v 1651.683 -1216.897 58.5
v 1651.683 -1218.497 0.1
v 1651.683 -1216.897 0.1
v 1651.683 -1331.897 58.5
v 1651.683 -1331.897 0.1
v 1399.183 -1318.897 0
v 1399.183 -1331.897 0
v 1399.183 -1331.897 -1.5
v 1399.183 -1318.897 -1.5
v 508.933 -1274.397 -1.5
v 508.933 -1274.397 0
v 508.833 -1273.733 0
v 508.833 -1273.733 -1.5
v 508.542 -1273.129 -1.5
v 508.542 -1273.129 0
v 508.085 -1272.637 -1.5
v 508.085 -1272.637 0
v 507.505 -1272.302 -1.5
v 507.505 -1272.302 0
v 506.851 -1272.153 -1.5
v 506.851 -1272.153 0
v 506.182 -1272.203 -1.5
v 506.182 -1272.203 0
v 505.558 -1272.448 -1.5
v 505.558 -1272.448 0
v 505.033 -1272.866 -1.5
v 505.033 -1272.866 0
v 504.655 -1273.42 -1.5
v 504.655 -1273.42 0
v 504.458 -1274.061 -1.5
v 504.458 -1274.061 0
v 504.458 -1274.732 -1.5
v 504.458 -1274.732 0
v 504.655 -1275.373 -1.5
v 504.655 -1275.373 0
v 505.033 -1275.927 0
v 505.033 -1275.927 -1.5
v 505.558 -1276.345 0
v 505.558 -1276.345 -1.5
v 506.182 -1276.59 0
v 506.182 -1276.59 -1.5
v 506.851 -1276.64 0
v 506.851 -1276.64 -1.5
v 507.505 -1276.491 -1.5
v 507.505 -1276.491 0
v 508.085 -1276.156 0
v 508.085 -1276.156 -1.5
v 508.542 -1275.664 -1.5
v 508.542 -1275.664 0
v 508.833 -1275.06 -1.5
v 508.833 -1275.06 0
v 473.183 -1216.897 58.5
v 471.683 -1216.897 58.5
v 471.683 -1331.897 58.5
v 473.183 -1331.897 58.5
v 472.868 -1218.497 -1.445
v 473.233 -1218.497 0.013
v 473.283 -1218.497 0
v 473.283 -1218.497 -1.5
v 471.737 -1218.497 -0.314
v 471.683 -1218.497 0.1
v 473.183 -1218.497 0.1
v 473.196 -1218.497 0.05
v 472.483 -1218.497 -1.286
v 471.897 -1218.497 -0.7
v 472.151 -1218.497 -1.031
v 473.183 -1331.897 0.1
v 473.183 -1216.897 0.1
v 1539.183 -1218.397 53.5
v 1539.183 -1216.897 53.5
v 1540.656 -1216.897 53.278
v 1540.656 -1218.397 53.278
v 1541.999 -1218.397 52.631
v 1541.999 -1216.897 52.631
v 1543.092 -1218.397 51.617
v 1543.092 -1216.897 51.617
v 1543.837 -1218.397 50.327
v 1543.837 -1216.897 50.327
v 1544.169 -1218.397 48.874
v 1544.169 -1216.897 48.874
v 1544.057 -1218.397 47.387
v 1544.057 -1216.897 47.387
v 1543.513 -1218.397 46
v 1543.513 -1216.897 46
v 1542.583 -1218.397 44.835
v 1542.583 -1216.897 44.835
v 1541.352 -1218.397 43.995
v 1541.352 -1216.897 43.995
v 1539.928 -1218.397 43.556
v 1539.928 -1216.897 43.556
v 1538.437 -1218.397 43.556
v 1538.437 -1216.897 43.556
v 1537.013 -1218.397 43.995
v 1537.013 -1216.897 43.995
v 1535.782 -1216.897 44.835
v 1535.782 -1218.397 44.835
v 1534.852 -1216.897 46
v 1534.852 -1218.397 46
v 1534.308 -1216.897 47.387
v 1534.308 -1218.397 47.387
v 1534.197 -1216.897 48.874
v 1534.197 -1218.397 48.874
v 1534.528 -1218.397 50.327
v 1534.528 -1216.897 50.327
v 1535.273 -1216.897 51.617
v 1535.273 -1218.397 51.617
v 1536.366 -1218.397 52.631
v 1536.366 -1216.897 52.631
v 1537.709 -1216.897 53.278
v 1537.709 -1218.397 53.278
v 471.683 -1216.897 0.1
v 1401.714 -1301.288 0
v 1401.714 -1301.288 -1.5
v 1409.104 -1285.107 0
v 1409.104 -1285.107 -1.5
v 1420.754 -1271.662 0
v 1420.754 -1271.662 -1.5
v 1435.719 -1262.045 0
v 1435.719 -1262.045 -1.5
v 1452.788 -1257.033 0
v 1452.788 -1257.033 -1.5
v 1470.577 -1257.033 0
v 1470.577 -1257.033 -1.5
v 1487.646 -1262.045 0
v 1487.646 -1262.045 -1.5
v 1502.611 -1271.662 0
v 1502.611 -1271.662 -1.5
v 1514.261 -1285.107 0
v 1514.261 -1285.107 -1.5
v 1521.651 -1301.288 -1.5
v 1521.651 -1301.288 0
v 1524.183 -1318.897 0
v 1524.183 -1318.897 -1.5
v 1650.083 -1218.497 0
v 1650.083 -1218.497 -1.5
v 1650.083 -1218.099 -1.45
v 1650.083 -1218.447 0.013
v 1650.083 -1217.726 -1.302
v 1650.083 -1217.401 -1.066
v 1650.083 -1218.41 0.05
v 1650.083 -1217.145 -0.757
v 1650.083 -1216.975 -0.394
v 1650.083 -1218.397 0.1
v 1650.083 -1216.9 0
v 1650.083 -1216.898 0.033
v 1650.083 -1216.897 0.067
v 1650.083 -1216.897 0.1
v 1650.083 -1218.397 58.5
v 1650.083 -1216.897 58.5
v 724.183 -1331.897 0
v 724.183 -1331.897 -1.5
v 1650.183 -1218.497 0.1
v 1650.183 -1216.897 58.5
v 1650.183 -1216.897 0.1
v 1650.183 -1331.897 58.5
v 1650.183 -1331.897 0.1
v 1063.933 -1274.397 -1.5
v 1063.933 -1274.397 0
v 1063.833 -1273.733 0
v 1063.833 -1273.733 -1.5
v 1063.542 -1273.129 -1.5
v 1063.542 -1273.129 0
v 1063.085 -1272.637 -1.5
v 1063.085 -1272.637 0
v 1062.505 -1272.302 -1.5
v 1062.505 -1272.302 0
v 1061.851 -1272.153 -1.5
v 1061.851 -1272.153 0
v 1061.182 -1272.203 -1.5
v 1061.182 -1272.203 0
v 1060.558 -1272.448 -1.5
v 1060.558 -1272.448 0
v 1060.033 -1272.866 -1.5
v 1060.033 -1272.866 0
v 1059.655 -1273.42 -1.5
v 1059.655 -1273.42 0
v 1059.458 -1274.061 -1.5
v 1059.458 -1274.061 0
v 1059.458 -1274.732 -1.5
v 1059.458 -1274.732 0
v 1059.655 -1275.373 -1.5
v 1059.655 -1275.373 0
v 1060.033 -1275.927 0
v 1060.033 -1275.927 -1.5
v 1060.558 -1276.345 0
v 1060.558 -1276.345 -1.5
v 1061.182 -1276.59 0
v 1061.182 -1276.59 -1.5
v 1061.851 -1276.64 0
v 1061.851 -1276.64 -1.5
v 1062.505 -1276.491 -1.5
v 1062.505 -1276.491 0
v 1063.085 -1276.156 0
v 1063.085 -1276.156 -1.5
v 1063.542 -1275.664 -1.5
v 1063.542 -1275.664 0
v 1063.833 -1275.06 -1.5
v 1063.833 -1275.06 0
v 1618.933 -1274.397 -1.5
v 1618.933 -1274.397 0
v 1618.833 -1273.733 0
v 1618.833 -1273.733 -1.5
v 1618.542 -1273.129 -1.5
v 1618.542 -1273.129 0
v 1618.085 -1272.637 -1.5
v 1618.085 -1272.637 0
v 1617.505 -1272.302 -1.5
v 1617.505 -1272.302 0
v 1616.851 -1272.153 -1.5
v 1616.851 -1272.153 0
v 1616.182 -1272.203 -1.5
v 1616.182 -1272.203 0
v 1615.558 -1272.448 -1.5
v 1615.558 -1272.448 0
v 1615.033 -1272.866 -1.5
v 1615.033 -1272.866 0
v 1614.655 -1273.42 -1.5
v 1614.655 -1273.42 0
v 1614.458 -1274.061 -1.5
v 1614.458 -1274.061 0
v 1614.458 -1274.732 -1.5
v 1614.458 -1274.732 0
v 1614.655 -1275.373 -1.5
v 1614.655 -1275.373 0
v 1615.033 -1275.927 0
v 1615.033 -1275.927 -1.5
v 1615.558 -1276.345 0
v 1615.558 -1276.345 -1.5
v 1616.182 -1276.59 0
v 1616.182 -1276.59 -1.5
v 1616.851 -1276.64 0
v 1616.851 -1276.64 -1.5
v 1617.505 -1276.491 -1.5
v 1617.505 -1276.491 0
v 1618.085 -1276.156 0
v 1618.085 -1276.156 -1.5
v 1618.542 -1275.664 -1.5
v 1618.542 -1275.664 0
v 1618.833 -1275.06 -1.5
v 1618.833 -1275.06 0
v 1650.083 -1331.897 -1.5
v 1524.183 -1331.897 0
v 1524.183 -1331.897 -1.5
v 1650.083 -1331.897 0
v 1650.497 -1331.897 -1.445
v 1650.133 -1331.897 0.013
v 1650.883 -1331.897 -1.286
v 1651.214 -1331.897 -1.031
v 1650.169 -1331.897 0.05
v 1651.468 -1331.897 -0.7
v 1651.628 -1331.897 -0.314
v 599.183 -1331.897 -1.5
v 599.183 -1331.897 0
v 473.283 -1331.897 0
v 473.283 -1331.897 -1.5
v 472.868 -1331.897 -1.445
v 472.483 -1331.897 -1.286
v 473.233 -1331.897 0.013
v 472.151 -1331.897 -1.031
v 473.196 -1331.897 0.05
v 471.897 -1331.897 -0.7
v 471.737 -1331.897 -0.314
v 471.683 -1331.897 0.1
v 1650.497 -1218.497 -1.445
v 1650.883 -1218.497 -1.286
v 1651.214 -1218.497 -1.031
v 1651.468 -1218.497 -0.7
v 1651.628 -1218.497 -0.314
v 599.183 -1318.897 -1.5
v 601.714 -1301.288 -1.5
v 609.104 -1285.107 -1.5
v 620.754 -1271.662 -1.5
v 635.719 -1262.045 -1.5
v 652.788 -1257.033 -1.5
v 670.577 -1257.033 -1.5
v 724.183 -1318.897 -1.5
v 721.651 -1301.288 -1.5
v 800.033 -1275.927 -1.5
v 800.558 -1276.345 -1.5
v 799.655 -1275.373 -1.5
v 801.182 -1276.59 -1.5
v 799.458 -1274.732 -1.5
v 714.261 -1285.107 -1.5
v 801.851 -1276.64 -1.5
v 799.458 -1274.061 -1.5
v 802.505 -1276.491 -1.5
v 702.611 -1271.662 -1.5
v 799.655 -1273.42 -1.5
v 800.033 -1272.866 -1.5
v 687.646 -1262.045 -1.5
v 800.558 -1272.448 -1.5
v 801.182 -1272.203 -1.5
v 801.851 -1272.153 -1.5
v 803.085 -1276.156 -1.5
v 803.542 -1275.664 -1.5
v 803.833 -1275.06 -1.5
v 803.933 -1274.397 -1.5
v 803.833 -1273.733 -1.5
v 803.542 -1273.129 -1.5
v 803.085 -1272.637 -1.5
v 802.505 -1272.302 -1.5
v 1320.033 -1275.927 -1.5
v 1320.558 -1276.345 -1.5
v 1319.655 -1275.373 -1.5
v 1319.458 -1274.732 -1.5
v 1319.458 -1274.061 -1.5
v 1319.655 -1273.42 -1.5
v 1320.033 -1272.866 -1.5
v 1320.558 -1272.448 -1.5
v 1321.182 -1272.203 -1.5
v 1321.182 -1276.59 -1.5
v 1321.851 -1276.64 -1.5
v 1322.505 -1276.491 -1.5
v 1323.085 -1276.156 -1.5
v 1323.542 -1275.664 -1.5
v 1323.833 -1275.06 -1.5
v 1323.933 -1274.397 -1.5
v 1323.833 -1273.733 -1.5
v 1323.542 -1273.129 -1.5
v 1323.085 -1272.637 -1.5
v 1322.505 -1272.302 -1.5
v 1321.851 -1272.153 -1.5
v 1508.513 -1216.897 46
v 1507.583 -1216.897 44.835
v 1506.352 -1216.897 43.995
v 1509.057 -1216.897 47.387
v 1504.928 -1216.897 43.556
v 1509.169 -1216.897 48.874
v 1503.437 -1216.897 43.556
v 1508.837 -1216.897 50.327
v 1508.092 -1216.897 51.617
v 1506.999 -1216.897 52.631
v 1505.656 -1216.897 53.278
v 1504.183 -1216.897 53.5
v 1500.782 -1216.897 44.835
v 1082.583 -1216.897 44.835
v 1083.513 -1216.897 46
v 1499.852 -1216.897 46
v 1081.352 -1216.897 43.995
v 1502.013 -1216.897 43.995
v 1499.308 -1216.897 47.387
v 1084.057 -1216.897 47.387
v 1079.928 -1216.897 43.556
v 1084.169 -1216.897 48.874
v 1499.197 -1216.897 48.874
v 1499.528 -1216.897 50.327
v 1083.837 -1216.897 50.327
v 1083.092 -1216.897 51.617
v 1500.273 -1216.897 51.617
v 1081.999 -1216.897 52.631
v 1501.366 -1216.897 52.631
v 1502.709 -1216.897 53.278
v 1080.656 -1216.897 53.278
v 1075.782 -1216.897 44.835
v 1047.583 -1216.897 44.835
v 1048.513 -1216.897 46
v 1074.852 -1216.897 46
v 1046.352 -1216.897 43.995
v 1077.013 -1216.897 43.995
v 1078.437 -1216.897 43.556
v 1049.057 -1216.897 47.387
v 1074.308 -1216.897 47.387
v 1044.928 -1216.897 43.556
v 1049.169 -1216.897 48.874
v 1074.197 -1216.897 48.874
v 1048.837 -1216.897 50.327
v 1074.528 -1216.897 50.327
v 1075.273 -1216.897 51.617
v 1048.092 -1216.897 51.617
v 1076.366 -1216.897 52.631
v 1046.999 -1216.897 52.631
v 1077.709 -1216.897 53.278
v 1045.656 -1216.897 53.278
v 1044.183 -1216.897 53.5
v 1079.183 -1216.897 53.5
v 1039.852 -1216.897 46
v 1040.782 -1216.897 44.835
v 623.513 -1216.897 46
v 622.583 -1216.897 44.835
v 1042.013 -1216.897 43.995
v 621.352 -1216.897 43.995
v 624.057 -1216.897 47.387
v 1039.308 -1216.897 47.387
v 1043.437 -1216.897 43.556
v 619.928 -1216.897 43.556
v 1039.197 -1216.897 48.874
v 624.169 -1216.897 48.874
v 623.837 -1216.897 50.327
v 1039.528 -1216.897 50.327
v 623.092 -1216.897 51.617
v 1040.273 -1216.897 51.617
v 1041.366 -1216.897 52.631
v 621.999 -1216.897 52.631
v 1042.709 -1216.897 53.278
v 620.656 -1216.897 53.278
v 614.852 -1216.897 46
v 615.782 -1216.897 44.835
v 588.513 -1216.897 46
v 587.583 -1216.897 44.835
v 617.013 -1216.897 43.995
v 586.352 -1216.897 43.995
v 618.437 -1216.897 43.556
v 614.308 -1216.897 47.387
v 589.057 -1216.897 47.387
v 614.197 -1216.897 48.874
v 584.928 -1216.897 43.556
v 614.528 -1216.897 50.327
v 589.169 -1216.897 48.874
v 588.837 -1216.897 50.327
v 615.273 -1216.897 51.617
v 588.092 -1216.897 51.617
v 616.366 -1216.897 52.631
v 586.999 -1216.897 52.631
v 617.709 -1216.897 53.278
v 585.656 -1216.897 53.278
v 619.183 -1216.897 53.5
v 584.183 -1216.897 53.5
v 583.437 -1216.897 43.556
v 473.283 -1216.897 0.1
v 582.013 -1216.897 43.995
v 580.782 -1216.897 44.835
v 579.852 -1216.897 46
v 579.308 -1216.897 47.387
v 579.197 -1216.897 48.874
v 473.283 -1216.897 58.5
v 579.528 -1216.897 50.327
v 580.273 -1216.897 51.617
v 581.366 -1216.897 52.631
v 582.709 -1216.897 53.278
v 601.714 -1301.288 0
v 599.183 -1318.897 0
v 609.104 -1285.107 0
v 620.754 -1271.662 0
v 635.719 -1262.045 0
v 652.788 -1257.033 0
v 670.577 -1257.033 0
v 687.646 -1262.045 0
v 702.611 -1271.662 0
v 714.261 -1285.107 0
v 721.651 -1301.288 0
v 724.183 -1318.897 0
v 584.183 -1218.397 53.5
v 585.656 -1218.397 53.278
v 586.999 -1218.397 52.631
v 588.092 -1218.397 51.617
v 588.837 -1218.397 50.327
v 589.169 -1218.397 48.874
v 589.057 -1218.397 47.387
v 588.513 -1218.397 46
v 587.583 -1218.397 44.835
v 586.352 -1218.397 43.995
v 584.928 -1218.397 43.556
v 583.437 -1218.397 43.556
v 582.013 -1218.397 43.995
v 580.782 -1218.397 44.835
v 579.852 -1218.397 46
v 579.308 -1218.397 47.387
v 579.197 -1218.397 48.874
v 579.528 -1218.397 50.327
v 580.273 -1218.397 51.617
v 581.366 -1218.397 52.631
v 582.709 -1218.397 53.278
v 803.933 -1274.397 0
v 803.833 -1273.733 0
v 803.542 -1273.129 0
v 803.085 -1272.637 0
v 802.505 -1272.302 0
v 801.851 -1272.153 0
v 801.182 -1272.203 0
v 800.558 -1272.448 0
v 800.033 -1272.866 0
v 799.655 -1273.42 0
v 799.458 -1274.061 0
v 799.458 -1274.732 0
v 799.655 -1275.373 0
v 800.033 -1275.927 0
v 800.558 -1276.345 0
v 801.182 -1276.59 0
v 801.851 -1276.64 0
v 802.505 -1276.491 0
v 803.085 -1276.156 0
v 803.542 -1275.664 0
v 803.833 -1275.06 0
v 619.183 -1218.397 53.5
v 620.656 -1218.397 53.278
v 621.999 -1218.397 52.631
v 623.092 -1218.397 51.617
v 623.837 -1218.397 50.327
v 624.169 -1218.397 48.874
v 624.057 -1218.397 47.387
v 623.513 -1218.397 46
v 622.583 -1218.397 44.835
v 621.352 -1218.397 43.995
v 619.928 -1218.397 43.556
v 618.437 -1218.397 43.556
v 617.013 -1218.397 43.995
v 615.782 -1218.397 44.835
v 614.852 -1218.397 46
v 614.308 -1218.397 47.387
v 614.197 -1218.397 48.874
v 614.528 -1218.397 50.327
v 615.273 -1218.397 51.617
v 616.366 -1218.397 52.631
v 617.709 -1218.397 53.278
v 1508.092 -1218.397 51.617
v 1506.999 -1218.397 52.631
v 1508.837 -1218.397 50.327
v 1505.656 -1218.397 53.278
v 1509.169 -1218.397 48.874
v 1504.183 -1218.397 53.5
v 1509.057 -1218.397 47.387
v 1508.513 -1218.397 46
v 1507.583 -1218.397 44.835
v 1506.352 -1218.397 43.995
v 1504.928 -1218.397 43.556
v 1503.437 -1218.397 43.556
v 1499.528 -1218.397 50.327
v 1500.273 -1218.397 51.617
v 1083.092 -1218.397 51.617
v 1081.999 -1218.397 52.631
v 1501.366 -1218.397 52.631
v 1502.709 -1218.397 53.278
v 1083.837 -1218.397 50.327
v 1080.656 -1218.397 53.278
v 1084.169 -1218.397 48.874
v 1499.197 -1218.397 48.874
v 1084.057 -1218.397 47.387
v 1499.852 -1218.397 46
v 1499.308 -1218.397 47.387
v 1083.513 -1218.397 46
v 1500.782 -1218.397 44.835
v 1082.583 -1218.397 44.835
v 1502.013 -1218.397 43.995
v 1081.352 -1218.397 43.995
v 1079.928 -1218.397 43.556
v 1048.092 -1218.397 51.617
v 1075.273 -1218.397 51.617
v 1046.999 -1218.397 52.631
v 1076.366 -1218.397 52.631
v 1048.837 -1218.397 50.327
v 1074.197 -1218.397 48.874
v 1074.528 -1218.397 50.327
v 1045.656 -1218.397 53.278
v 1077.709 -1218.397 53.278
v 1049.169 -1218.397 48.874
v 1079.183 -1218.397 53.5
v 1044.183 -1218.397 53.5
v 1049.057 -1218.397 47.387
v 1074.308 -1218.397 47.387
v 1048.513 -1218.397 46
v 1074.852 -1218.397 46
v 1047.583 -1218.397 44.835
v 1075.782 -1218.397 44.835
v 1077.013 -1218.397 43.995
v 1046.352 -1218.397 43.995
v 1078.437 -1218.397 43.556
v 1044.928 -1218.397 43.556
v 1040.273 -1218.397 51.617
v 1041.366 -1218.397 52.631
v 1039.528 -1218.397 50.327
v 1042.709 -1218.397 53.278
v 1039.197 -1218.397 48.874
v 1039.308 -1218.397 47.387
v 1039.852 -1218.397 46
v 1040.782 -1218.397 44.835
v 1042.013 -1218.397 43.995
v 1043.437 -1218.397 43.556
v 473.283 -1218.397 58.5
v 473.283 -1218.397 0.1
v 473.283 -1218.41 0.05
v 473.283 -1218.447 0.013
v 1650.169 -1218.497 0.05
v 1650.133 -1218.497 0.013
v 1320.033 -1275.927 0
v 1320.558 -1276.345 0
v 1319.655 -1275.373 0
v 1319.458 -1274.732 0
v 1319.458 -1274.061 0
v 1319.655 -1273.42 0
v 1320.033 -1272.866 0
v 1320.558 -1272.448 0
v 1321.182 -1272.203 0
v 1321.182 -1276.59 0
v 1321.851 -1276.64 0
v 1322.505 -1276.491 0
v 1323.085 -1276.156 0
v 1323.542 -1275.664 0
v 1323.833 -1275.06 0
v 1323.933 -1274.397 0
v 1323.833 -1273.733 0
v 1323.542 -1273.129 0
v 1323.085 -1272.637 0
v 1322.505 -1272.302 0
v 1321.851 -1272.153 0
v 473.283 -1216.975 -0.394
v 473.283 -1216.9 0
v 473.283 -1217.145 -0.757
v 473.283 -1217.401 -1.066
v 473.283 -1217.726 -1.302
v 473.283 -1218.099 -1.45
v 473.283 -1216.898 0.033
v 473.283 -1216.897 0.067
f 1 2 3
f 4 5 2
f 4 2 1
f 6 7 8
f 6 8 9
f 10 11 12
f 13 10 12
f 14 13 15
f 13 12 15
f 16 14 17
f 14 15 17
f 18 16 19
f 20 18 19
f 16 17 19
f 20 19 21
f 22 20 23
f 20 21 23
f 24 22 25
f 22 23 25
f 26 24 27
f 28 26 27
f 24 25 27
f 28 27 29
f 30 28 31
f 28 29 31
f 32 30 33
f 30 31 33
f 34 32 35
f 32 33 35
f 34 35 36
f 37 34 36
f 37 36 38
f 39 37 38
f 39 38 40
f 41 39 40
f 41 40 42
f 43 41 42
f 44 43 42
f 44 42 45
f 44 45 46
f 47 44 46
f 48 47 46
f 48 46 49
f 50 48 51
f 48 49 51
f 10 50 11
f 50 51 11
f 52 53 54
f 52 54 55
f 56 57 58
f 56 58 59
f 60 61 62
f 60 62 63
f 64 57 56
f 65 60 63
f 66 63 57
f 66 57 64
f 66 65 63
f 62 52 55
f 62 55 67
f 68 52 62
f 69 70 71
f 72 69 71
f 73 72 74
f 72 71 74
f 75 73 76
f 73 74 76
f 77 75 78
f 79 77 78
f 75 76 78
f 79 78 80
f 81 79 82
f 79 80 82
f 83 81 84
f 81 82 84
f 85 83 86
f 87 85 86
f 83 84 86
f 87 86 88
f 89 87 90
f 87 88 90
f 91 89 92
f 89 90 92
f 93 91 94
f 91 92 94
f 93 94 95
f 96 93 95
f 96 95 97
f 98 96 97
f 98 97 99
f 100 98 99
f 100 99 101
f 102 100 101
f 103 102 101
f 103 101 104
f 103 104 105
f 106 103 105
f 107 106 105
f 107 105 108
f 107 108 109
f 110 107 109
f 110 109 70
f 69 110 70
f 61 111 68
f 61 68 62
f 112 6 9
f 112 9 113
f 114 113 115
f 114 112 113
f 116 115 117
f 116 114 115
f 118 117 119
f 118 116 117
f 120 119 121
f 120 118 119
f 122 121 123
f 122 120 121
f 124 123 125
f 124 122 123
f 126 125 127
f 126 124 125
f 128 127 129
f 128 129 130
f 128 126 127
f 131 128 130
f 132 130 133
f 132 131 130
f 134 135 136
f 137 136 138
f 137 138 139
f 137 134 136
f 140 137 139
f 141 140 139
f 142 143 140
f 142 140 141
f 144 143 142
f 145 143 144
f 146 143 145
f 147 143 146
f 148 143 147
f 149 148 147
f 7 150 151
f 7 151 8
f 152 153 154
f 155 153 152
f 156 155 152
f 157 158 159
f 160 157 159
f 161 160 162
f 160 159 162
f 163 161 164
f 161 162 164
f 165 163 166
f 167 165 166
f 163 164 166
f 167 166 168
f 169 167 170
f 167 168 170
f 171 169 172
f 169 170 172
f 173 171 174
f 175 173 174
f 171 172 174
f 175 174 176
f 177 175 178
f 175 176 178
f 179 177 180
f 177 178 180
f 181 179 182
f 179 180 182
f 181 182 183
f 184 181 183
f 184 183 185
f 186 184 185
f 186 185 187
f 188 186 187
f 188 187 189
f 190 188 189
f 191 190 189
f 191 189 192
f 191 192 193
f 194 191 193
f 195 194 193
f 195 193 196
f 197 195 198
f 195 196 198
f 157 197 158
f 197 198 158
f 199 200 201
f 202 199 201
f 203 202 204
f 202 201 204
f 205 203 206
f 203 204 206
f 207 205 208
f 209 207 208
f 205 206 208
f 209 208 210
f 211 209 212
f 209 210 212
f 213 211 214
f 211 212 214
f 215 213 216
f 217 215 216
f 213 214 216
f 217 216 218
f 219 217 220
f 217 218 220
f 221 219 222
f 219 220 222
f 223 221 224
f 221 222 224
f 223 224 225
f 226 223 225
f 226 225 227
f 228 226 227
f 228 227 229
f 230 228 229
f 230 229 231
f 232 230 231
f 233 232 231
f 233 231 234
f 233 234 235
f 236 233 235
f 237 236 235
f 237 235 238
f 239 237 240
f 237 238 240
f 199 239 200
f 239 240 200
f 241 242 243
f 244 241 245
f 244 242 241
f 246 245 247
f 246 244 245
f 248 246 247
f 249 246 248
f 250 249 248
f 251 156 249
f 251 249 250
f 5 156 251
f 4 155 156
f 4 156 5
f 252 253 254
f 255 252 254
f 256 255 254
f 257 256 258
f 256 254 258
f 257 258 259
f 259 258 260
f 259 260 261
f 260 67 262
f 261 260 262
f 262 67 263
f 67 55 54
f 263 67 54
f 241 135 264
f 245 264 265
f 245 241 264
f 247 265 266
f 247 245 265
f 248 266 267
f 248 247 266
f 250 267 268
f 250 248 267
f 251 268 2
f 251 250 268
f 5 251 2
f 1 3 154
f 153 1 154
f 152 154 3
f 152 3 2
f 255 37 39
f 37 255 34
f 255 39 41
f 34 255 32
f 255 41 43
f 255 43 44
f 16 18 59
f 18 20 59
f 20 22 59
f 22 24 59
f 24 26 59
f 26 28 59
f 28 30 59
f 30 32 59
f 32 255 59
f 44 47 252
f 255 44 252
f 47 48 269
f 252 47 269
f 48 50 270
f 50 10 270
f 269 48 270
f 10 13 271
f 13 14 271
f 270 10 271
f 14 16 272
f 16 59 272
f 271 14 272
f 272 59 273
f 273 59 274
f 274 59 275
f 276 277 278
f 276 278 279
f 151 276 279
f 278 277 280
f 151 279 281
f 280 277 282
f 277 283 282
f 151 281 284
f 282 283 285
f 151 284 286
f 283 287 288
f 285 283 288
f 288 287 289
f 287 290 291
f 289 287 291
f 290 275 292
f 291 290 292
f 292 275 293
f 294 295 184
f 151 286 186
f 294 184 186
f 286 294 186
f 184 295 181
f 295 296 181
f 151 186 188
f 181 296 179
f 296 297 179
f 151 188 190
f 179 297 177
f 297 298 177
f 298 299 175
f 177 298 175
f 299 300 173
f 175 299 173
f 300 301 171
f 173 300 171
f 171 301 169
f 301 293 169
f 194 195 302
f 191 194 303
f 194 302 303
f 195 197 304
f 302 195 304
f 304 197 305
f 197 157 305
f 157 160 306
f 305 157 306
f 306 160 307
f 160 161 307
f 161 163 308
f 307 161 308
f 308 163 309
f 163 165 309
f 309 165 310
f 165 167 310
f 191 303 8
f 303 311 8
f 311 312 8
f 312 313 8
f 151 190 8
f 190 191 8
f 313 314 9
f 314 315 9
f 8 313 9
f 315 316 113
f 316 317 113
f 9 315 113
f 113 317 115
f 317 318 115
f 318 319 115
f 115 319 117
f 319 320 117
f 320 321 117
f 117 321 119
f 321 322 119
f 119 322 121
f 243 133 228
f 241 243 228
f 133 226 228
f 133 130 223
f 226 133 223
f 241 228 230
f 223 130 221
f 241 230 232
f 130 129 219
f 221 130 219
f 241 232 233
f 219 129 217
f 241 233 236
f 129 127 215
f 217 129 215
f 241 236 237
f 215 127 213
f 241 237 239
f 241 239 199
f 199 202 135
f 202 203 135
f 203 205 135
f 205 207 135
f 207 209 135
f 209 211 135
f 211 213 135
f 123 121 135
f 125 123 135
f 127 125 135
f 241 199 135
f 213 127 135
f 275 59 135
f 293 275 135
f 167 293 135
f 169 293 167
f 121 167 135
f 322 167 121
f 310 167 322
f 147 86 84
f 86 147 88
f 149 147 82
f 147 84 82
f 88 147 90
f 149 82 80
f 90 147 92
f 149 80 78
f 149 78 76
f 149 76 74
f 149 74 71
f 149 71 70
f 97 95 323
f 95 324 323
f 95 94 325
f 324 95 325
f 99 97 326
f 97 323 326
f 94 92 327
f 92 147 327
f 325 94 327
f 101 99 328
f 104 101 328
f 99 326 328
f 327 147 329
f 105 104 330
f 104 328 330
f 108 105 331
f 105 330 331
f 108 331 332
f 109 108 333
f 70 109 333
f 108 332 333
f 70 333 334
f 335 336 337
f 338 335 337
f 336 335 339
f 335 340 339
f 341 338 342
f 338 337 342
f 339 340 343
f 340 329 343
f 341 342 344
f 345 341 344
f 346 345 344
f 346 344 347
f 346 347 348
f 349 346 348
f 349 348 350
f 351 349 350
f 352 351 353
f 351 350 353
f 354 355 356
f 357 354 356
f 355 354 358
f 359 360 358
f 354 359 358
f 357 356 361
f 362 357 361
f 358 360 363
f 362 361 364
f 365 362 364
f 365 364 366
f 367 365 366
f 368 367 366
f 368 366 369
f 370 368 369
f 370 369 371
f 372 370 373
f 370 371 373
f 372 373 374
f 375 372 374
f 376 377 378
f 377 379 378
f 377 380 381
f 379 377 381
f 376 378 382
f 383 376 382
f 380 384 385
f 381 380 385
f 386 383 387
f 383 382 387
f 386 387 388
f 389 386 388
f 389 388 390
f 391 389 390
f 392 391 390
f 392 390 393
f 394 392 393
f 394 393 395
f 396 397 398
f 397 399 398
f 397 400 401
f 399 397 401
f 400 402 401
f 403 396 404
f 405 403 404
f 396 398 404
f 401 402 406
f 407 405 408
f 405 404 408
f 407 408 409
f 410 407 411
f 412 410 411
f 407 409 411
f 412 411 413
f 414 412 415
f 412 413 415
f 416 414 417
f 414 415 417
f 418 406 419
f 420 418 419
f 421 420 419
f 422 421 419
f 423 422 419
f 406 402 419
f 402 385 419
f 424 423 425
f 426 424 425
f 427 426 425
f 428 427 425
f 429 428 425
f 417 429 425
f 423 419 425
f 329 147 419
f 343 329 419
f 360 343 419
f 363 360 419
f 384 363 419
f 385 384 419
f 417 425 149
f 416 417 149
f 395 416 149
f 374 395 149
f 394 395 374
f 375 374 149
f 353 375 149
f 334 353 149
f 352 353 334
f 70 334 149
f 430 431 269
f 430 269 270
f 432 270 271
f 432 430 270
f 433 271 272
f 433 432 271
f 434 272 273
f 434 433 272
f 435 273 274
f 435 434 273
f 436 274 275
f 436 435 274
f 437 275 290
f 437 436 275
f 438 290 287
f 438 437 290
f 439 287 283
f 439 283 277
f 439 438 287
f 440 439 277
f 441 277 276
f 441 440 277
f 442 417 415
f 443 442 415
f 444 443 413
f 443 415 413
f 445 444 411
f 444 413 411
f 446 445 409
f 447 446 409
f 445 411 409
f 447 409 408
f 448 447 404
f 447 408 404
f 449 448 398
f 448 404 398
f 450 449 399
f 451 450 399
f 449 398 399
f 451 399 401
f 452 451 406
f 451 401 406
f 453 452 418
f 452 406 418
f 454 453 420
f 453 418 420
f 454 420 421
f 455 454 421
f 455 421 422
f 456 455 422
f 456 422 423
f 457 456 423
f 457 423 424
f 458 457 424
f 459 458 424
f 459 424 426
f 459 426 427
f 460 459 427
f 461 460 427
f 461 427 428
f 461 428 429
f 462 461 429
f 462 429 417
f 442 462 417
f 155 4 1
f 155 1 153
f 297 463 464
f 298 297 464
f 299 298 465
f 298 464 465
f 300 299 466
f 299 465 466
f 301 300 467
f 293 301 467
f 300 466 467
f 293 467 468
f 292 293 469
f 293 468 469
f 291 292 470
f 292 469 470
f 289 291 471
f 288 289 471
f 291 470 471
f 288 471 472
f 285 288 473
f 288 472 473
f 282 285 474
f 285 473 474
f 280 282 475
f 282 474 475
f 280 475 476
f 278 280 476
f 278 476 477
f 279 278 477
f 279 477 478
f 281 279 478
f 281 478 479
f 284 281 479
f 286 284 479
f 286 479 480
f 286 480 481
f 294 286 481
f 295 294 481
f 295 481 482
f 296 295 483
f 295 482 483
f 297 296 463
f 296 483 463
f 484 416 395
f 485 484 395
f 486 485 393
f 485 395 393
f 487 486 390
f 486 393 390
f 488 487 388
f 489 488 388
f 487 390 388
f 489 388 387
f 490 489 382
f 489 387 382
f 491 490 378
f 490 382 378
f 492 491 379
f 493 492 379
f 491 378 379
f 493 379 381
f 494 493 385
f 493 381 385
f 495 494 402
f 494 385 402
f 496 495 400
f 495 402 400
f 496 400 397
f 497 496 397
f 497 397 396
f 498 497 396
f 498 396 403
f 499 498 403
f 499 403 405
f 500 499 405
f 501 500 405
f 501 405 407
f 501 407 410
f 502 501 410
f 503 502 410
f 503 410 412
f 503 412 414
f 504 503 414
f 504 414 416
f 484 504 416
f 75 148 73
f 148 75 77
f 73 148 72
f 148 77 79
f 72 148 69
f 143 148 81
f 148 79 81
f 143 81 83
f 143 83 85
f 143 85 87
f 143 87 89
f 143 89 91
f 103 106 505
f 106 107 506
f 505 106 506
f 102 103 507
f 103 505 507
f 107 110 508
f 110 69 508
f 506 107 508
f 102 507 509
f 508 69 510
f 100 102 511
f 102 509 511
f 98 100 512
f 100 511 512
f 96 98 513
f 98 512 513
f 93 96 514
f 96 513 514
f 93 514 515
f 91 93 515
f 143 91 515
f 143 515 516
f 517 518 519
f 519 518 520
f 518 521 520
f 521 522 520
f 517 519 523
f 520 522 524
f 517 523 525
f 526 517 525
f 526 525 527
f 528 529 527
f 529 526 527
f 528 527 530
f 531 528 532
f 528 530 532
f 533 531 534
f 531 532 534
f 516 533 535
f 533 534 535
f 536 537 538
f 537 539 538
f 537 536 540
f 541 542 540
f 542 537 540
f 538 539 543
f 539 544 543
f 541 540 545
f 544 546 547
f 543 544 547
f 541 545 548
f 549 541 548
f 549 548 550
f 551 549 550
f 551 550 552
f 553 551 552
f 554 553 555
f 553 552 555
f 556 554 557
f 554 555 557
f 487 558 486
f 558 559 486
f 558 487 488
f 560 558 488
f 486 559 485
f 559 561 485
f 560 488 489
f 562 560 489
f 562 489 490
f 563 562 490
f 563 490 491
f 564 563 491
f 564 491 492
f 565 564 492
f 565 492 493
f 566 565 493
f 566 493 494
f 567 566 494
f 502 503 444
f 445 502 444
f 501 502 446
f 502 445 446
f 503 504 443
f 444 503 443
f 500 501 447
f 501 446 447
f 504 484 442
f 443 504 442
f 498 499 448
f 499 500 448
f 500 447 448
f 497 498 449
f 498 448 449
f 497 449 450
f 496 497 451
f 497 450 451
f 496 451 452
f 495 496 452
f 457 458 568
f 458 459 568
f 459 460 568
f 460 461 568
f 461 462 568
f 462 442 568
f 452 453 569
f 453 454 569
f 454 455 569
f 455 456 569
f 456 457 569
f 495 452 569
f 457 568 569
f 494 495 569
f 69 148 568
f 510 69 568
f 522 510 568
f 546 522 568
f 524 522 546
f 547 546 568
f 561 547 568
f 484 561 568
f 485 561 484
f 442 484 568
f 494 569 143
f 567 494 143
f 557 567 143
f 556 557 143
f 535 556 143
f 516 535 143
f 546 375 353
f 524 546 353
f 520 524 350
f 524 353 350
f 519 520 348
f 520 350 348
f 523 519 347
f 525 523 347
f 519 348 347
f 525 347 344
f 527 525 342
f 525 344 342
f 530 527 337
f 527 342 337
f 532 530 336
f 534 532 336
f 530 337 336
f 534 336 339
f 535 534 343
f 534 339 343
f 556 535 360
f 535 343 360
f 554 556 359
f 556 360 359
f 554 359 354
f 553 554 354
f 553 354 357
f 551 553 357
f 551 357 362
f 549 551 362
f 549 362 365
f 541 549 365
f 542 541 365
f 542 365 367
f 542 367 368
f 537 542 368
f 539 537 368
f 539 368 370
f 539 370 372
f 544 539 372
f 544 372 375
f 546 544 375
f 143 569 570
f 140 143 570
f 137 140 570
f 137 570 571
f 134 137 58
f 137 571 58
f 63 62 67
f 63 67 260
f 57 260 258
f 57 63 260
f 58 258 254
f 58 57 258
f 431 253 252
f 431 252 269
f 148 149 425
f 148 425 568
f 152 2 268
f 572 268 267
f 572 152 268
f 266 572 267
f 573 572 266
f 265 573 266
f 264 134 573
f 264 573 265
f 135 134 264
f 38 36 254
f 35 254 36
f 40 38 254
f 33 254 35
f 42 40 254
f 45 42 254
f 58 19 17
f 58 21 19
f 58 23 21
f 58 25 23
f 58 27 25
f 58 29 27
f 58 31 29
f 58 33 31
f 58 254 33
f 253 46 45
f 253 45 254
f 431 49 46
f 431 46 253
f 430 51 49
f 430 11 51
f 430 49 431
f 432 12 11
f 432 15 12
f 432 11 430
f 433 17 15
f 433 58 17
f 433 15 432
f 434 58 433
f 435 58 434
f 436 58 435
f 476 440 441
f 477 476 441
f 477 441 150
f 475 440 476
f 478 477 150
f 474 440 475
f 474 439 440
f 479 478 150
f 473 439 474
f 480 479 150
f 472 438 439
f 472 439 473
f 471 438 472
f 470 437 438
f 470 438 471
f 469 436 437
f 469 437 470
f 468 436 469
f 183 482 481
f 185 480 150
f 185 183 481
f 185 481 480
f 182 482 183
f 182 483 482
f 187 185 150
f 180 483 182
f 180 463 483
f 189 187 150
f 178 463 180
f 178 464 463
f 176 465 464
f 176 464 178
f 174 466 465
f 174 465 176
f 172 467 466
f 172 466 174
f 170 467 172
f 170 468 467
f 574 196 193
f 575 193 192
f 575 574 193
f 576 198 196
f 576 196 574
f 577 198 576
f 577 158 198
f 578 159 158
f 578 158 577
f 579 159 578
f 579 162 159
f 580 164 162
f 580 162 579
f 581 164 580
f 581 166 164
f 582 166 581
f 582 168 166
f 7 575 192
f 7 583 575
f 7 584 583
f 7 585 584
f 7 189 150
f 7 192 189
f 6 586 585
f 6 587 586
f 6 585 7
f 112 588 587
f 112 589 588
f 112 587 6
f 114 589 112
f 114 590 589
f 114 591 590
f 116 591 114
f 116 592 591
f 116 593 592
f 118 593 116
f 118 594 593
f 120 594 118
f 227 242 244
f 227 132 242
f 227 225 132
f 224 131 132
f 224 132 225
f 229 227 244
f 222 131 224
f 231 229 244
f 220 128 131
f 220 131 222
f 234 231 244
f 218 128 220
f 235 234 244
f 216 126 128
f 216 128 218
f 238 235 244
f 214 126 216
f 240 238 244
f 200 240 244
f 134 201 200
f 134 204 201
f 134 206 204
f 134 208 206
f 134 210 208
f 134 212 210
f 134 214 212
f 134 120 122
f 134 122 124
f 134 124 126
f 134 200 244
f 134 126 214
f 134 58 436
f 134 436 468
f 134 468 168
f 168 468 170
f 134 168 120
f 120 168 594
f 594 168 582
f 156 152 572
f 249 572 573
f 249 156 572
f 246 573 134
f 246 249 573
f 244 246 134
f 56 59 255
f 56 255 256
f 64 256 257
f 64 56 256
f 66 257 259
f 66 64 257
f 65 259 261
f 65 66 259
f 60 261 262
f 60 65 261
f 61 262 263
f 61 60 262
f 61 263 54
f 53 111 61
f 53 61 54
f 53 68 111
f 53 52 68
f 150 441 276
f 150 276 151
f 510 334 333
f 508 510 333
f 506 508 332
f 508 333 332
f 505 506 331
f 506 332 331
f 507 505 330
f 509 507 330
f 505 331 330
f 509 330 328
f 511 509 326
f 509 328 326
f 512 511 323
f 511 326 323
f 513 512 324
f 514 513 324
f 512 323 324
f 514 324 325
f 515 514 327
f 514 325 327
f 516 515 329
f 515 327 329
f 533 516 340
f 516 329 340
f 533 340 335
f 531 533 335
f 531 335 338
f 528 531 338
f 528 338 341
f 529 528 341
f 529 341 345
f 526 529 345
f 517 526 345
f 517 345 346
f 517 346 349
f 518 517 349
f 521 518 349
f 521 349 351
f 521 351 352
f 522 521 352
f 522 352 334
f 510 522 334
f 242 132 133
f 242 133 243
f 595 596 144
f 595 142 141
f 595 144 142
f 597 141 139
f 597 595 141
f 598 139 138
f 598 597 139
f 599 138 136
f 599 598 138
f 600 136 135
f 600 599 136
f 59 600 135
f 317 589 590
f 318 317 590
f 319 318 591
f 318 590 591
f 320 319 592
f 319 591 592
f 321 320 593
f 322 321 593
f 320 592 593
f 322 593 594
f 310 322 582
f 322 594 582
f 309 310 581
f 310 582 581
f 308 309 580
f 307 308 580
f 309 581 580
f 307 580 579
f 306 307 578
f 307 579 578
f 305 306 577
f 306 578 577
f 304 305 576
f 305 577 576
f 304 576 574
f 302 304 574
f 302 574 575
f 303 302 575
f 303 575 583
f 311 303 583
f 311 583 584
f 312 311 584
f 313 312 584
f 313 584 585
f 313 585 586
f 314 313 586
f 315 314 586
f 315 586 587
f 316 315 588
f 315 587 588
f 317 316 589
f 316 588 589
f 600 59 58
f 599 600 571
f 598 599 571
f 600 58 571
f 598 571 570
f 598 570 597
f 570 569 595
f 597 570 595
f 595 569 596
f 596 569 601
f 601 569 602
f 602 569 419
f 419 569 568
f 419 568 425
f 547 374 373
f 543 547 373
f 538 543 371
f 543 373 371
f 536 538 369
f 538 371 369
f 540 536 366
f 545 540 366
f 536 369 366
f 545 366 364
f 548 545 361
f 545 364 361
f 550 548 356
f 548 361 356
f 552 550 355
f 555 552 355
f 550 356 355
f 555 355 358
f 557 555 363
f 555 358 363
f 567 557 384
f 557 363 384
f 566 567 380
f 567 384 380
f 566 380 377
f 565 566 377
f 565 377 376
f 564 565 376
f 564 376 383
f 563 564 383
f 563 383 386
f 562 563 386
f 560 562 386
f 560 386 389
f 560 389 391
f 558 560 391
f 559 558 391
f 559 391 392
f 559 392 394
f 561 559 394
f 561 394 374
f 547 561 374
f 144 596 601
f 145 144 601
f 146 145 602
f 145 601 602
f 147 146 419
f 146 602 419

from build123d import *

# Parameters (mm, degrees)
SKETCH_1_R                         = 2.25
SM_BASE_FLANGE_1_DEPTH             = 1.5
SM_EDGE_FLANGE_1_STRIP_W           = 6.2
SM_EDGE_FLANGE_1_STRIP_H           = 1.5
SM_EDGE_FLANGE_1_STRIP_CUT_DEPTH   = 115
SM_EDGE_FLANGE_1_STRIP_2_W         = 6.2
SM_EDGE_FLANGE_1_STRIP_2_H         = 1.5
SM_EDGE_FLANGE_1_STRIP_CUT_2_DEPTH = 115
SM_EDGE_FLANGE_1_DEPTH             = 115
SM_EDGE_FLANGE_1_BEND_DEPTH        = 115
SM_START                           = 471.682547587
SM_EDGE_FLANGE_2_DEPTH             = 1180
SM_EDGE_FLANGE_2_2_DEPTH           = 1.6
SM_START_2                         = 1650.082547587
SM_EDGE_FLANGE_2_3_DEPTH           = 1.6
SM_START_3                         = 473.282547587
SM_EDGE_FLANGE_2_4_DEPTH           = 1176.8
SKETCH_15_R                        = 5
CUT_EXTRUDE_1_DEPTH                = 10


# Read off the part's stored shape, not the designer's step: 边线-法兰2
# Sheet-metal steps are written as plain solids
with BuildPart() as part:
    # Sketch 1 → 基体-法兰1 (new body)
    with BuildSketch(Plane.XY):
        with BuildLine():
            Line((471.682547587, -1331.896552128), (473.182547587, -1331.896552128))
            Line((473.182547587, -1331.896552128), (473.919147587, -1331.896552128))
            Line((473.919147587, -1331.896552128), (599.182547587, -1331.896552128))
            Line((599.182547587, -1331.896552128), (599.182547587, -1318.896552128))
            ThreePointArc((599.182547587, -1318.896552128), (661.682547587, -1256.396552128), (724.182547587, -1318.896552128))
            Line((724.182547587, -1318.896552128), (724.182547587, -1331.896552128))
            Line((724.182547587, -1331.896552128), (1399.182547587, -1331.896552128))
            Line((1399.182547587, -1331.896552128), (1399.182547587, -1318.896552128))
            ThreePointArc((1399.182547587, -1318.896552128), (1461.682547587, -1256.396552128), (1524.182547587, -1318.896552128))
            Line((1524.182547587, -1318.896552128), (1524.182547587, -1331.896552128))
            Line((1524.182547587, -1331.896552128), (1649.445947587, -1331.896552128))
            Line((1649.445947587, -1331.896552128), (1650.182547587, -1331.896552128))
            Line((1650.182547587, -1331.896552128), (1651.682547587, -1331.896552128))
            Line((1651.682547587, -1331.896552128), (1651.682547587, -1216.896552128))
            Line((1651.682547587, -1216.896552128), (471.682547587, -1216.896552128))
            Line((471.682547587, -1216.896552128), (471.682547587, -1331.896552128))
        make_face()
        with Locations((801.682547587, -1274.396552128)):
            Circle(SKETCH_1_R, mode=Mode.SUBTRACT)
        with Locations((1321.682547587, -1274.396552128)):
            Circle(SKETCH_1_R, mode=Mode.SUBTRACT)
        with Locations((506.682547587, -1274.396552128)):
            Circle(SKETCH_1_R, mode=Mode.SUBTRACT)
        with Locations((1061.682547587, -1274.396552128)):
            Circle(SKETCH_1_R, mode=Mode.SUBTRACT)
        with Locations((1616.682547587, -1274.396552128)):
            Circle(SKETCH_1_R, mode=Mode.SUBTRACT)
    extrude(amount=-SM_BASE_FLANGE_1_DEPTH)

    # 边线-法兰1 strip (across the edge) → 边线-法兰1 strip cut (cut)
    with BuildSketch(Plane(origin=(1651.682547587, -1331.896552128, 0), x_dir=(-1, 0, 0), z_dir=(0, 1, 0))):
        with Locations((-1.5, -0.75)):
            Rectangle(SM_EDGE_FLANGE_1_STRIP_W, SM_EDGE_FLANGE_1_STRIP_H)
    extrude(amount=SM_EDGE_FLANGE_1_STRIP_CUT_DEPTH, mode=Mode.SUBTRACT)

    # 边线-法兰1 strip 2 (across the edge) → 边线-法兰1 strip cut 2 (cut)
    with BuildSketch(Plane(origin=(471.682547587, -1216.896552128, 0), x_dir=(1, 0, 0), z_dir=(0, -1, 0))):
        with Locations((-1.5, -0.75)):
            Rectangle(SM_EDGE_FLANGE_1_STRIP_2_W, SM_EDGE_FLANGE_1_STRIP_2_H)
    extrude(amount=SM_EDGE_FLANGE_1_STRIP_CUT_2_DEPTH, mode=Mode.SUBTRACT)

    # 边线-法兰1 section (across the edge) → 边线-法兰1 (add)
    with BuildSketch(Plane(origin=(1651.682547587, -1331.896552128, 0), x_dir=(-1, 0, 0), z_dir=(0, 1, 0))):
        with BuildLine():
            Line((0, 0.1), (0, 58.5))
            Line((0, 58.5), (1.5, 58.5))
            Line((1.5, 58.5), (1.5, 0.1))
            ThreePointArc((1.5, 0.1), (1.529289322, 0.029289322), (1.6, 0))
            Line((1.6, 0), (1.6, -1.5))
            ThreePointArc((1.6, -1.5), (0.46862915, -1.03137085), (0, 0.1))
        make_face()
    extrude(amount=SM_EDGE_FLANGE_1_DEPTH)

    # 边线-法兰1 section 2 (across the edge) → 边线-法兰1 bend (add)
    with BuildSketch(Plane(origin=(471.682547587, -1216.896552128, 0), x_dir=(1, 0, 0), z_dir=(0, -1, 0))):
        with BuildLine():
            Line((0, 0.1), (0, 58.5))
            Line((0, 58.5), (1.5, 58.5))
            Line((1.5, 58.5), (1.5, 0.1))
            ThreePointArc((1.5, 0.1), (1.529289322, 0.029289322), (1.6, 0))
            Line((1.6, 0), (1.6, -1.5))
            ThreePointArc((1.6, -1.5), (0.46862915, -1.03137085), (0, 0.1))
        make_face()
    extrude(amount=SM_EDGE_FLANGE_1_BEND_DEPTH)

    # 边线-法兰2 outline → 边线-法兰2 (cut)
    with BuildSketch(Plane.YZ.offset(SM_START)):
        with BuildLine():
            Line((-1218.396552128, 0.1), (-1218.496552128, 0.1))
            Line((-1218.496552128, 0.1), (-1218.496552128, 0))
            ThreePointArc((-1218.496552128, 0), (-1218.42584145, 0.029289322), (-1218.396552128, 0.1))
        make_face()
        with BuildLine():
            ThreePointArc((-1216.896552128, 0.1), (-1217.365181278, -1.03137085), (-1218.496552128, -1.5))
            Line((-1218.496552128, -1.5), (-1216.896552128, -1.5))
            Line((-1216.896552128, -1.5), (-1216.896552128, 0.1))
        make_face()
    extrude(amount=SM_EDGE_FLANGE_2_DEPTH, mode=Mode.SUBTRACT)

    # Sm Edge Flange 2 2 outline → Sm Edge Flange 2 2 (cut)
    with BuildSketch(Plane.YZ.offset(SM_START)):
        with BuildLine():
            Line((-1216.896552128, 0.1), (-1218.396552128, 0.1))
            ThreePointArc((-1218.396552128, 0.1), (-1218.42584145, 0.029289322), (-1218.496552128, 0))
            Line((-1218.496552128, 0), (-1218.496552128, -1.5))
            ThreePointArc((-1218.496552128, -1.5), (-1217.365181278, -1.03137085), (-1216.896552128, 0.1))
        make_face()
    extrude(amount=SM_EDGE_FLANGE_2_2_DEPTH, mode=Mode.SUBTRACT)

    # Sm Edge Flange 2 3 outline → Sm Edge Flange 2 3 (cut)
    with BuildSketch(Plane.YZ.offset(SM_START_2)):
        with BuildLine():
            Line((-1216.896552128, 0.1), (-1218.396552128, 0.1))
            ThreePointArc((-1218.396552128, 0.1), (-1218.42584145, 0.029289322), (-1218.496552128, 0))
            Line((-1218.496552128, 0), (-1218.496552128, -1.5))
            ThreePointArc((-1218.496552128, -1.5), (-1217.365181278, -1.03137085), (-1216.896552128, 0.1))
        make_face()
    extrude(amount=SM_EDGE_FLANGE_2_3_DEPTH, mode=Mode.SUBTRACT)

    # Sm Edge Flange 2 4 outline → Sm Edge Flange 2 4 (add)
    with BuildSketch(Plane.YZ.offset(SM_START_3)):
        with BuildLine():
            Line((-1218.396552128, 58.5), (-1218.396552128, 0.1))
            ThreePointArc((-1218.396552128, 0.1), (-1218.42584145, 0.029289322), (-1218.496552128, 0))
            Line((-1218.496552128, 0), (-1216.899680186, 0))
            ThreePointArc((-1216.899680186, 0), (-1216.897334334, 0.049975544), (-1216.896552128, 0.1))
            Line((-1216.896552128, 0.1), (-1216.896552128, 58.5))
            Line((-1216.896552128, 58.5), (-1218.396552128, 58.5))
        make_face()
    extrude(amount=SM_EDGE_FLANGE_2_4_DEPTH)

    # 草图15 → 切除-拉伸1 (cut)
    with BuildSketch(Plane(origin=(0, -1216.896552128, 0), x_dir=(1, 0, 0), z_dir=(0, 1, 0))):
        with Locations(Location((619.182547587, -48.5, 0), (0, 0, 270))):
            Circle(SKETCH_15_R)
        with Locations(Location((584.182547587, -48.5, 0), (0, 0, 270))):
            Circle(SKETCH_15_R)
        with Locations(Location((1079.182547587, -48.5, 0), (0, 0, 270))):
            Circle(SKETCH_15_R)
        with Locations(Location((1044.182547587, -48.5, 0), (0, 0, 270))):
            Circle(SKETCH_15_R)
        with Locations(Location((1504.182547587, -48.5, 0), (0, 0, 270))):
            Circle(SKETCH_15_R)
        with Locations(Location((1539.182547587, -48.5, 0), (0, 0, 270))):
            Circle(SKETCH_15_R)
    extrude(amount=-CUT_EXTRUDE_1_DEPTH, mode=Mode.SUBTRACT)


solid = part.part
